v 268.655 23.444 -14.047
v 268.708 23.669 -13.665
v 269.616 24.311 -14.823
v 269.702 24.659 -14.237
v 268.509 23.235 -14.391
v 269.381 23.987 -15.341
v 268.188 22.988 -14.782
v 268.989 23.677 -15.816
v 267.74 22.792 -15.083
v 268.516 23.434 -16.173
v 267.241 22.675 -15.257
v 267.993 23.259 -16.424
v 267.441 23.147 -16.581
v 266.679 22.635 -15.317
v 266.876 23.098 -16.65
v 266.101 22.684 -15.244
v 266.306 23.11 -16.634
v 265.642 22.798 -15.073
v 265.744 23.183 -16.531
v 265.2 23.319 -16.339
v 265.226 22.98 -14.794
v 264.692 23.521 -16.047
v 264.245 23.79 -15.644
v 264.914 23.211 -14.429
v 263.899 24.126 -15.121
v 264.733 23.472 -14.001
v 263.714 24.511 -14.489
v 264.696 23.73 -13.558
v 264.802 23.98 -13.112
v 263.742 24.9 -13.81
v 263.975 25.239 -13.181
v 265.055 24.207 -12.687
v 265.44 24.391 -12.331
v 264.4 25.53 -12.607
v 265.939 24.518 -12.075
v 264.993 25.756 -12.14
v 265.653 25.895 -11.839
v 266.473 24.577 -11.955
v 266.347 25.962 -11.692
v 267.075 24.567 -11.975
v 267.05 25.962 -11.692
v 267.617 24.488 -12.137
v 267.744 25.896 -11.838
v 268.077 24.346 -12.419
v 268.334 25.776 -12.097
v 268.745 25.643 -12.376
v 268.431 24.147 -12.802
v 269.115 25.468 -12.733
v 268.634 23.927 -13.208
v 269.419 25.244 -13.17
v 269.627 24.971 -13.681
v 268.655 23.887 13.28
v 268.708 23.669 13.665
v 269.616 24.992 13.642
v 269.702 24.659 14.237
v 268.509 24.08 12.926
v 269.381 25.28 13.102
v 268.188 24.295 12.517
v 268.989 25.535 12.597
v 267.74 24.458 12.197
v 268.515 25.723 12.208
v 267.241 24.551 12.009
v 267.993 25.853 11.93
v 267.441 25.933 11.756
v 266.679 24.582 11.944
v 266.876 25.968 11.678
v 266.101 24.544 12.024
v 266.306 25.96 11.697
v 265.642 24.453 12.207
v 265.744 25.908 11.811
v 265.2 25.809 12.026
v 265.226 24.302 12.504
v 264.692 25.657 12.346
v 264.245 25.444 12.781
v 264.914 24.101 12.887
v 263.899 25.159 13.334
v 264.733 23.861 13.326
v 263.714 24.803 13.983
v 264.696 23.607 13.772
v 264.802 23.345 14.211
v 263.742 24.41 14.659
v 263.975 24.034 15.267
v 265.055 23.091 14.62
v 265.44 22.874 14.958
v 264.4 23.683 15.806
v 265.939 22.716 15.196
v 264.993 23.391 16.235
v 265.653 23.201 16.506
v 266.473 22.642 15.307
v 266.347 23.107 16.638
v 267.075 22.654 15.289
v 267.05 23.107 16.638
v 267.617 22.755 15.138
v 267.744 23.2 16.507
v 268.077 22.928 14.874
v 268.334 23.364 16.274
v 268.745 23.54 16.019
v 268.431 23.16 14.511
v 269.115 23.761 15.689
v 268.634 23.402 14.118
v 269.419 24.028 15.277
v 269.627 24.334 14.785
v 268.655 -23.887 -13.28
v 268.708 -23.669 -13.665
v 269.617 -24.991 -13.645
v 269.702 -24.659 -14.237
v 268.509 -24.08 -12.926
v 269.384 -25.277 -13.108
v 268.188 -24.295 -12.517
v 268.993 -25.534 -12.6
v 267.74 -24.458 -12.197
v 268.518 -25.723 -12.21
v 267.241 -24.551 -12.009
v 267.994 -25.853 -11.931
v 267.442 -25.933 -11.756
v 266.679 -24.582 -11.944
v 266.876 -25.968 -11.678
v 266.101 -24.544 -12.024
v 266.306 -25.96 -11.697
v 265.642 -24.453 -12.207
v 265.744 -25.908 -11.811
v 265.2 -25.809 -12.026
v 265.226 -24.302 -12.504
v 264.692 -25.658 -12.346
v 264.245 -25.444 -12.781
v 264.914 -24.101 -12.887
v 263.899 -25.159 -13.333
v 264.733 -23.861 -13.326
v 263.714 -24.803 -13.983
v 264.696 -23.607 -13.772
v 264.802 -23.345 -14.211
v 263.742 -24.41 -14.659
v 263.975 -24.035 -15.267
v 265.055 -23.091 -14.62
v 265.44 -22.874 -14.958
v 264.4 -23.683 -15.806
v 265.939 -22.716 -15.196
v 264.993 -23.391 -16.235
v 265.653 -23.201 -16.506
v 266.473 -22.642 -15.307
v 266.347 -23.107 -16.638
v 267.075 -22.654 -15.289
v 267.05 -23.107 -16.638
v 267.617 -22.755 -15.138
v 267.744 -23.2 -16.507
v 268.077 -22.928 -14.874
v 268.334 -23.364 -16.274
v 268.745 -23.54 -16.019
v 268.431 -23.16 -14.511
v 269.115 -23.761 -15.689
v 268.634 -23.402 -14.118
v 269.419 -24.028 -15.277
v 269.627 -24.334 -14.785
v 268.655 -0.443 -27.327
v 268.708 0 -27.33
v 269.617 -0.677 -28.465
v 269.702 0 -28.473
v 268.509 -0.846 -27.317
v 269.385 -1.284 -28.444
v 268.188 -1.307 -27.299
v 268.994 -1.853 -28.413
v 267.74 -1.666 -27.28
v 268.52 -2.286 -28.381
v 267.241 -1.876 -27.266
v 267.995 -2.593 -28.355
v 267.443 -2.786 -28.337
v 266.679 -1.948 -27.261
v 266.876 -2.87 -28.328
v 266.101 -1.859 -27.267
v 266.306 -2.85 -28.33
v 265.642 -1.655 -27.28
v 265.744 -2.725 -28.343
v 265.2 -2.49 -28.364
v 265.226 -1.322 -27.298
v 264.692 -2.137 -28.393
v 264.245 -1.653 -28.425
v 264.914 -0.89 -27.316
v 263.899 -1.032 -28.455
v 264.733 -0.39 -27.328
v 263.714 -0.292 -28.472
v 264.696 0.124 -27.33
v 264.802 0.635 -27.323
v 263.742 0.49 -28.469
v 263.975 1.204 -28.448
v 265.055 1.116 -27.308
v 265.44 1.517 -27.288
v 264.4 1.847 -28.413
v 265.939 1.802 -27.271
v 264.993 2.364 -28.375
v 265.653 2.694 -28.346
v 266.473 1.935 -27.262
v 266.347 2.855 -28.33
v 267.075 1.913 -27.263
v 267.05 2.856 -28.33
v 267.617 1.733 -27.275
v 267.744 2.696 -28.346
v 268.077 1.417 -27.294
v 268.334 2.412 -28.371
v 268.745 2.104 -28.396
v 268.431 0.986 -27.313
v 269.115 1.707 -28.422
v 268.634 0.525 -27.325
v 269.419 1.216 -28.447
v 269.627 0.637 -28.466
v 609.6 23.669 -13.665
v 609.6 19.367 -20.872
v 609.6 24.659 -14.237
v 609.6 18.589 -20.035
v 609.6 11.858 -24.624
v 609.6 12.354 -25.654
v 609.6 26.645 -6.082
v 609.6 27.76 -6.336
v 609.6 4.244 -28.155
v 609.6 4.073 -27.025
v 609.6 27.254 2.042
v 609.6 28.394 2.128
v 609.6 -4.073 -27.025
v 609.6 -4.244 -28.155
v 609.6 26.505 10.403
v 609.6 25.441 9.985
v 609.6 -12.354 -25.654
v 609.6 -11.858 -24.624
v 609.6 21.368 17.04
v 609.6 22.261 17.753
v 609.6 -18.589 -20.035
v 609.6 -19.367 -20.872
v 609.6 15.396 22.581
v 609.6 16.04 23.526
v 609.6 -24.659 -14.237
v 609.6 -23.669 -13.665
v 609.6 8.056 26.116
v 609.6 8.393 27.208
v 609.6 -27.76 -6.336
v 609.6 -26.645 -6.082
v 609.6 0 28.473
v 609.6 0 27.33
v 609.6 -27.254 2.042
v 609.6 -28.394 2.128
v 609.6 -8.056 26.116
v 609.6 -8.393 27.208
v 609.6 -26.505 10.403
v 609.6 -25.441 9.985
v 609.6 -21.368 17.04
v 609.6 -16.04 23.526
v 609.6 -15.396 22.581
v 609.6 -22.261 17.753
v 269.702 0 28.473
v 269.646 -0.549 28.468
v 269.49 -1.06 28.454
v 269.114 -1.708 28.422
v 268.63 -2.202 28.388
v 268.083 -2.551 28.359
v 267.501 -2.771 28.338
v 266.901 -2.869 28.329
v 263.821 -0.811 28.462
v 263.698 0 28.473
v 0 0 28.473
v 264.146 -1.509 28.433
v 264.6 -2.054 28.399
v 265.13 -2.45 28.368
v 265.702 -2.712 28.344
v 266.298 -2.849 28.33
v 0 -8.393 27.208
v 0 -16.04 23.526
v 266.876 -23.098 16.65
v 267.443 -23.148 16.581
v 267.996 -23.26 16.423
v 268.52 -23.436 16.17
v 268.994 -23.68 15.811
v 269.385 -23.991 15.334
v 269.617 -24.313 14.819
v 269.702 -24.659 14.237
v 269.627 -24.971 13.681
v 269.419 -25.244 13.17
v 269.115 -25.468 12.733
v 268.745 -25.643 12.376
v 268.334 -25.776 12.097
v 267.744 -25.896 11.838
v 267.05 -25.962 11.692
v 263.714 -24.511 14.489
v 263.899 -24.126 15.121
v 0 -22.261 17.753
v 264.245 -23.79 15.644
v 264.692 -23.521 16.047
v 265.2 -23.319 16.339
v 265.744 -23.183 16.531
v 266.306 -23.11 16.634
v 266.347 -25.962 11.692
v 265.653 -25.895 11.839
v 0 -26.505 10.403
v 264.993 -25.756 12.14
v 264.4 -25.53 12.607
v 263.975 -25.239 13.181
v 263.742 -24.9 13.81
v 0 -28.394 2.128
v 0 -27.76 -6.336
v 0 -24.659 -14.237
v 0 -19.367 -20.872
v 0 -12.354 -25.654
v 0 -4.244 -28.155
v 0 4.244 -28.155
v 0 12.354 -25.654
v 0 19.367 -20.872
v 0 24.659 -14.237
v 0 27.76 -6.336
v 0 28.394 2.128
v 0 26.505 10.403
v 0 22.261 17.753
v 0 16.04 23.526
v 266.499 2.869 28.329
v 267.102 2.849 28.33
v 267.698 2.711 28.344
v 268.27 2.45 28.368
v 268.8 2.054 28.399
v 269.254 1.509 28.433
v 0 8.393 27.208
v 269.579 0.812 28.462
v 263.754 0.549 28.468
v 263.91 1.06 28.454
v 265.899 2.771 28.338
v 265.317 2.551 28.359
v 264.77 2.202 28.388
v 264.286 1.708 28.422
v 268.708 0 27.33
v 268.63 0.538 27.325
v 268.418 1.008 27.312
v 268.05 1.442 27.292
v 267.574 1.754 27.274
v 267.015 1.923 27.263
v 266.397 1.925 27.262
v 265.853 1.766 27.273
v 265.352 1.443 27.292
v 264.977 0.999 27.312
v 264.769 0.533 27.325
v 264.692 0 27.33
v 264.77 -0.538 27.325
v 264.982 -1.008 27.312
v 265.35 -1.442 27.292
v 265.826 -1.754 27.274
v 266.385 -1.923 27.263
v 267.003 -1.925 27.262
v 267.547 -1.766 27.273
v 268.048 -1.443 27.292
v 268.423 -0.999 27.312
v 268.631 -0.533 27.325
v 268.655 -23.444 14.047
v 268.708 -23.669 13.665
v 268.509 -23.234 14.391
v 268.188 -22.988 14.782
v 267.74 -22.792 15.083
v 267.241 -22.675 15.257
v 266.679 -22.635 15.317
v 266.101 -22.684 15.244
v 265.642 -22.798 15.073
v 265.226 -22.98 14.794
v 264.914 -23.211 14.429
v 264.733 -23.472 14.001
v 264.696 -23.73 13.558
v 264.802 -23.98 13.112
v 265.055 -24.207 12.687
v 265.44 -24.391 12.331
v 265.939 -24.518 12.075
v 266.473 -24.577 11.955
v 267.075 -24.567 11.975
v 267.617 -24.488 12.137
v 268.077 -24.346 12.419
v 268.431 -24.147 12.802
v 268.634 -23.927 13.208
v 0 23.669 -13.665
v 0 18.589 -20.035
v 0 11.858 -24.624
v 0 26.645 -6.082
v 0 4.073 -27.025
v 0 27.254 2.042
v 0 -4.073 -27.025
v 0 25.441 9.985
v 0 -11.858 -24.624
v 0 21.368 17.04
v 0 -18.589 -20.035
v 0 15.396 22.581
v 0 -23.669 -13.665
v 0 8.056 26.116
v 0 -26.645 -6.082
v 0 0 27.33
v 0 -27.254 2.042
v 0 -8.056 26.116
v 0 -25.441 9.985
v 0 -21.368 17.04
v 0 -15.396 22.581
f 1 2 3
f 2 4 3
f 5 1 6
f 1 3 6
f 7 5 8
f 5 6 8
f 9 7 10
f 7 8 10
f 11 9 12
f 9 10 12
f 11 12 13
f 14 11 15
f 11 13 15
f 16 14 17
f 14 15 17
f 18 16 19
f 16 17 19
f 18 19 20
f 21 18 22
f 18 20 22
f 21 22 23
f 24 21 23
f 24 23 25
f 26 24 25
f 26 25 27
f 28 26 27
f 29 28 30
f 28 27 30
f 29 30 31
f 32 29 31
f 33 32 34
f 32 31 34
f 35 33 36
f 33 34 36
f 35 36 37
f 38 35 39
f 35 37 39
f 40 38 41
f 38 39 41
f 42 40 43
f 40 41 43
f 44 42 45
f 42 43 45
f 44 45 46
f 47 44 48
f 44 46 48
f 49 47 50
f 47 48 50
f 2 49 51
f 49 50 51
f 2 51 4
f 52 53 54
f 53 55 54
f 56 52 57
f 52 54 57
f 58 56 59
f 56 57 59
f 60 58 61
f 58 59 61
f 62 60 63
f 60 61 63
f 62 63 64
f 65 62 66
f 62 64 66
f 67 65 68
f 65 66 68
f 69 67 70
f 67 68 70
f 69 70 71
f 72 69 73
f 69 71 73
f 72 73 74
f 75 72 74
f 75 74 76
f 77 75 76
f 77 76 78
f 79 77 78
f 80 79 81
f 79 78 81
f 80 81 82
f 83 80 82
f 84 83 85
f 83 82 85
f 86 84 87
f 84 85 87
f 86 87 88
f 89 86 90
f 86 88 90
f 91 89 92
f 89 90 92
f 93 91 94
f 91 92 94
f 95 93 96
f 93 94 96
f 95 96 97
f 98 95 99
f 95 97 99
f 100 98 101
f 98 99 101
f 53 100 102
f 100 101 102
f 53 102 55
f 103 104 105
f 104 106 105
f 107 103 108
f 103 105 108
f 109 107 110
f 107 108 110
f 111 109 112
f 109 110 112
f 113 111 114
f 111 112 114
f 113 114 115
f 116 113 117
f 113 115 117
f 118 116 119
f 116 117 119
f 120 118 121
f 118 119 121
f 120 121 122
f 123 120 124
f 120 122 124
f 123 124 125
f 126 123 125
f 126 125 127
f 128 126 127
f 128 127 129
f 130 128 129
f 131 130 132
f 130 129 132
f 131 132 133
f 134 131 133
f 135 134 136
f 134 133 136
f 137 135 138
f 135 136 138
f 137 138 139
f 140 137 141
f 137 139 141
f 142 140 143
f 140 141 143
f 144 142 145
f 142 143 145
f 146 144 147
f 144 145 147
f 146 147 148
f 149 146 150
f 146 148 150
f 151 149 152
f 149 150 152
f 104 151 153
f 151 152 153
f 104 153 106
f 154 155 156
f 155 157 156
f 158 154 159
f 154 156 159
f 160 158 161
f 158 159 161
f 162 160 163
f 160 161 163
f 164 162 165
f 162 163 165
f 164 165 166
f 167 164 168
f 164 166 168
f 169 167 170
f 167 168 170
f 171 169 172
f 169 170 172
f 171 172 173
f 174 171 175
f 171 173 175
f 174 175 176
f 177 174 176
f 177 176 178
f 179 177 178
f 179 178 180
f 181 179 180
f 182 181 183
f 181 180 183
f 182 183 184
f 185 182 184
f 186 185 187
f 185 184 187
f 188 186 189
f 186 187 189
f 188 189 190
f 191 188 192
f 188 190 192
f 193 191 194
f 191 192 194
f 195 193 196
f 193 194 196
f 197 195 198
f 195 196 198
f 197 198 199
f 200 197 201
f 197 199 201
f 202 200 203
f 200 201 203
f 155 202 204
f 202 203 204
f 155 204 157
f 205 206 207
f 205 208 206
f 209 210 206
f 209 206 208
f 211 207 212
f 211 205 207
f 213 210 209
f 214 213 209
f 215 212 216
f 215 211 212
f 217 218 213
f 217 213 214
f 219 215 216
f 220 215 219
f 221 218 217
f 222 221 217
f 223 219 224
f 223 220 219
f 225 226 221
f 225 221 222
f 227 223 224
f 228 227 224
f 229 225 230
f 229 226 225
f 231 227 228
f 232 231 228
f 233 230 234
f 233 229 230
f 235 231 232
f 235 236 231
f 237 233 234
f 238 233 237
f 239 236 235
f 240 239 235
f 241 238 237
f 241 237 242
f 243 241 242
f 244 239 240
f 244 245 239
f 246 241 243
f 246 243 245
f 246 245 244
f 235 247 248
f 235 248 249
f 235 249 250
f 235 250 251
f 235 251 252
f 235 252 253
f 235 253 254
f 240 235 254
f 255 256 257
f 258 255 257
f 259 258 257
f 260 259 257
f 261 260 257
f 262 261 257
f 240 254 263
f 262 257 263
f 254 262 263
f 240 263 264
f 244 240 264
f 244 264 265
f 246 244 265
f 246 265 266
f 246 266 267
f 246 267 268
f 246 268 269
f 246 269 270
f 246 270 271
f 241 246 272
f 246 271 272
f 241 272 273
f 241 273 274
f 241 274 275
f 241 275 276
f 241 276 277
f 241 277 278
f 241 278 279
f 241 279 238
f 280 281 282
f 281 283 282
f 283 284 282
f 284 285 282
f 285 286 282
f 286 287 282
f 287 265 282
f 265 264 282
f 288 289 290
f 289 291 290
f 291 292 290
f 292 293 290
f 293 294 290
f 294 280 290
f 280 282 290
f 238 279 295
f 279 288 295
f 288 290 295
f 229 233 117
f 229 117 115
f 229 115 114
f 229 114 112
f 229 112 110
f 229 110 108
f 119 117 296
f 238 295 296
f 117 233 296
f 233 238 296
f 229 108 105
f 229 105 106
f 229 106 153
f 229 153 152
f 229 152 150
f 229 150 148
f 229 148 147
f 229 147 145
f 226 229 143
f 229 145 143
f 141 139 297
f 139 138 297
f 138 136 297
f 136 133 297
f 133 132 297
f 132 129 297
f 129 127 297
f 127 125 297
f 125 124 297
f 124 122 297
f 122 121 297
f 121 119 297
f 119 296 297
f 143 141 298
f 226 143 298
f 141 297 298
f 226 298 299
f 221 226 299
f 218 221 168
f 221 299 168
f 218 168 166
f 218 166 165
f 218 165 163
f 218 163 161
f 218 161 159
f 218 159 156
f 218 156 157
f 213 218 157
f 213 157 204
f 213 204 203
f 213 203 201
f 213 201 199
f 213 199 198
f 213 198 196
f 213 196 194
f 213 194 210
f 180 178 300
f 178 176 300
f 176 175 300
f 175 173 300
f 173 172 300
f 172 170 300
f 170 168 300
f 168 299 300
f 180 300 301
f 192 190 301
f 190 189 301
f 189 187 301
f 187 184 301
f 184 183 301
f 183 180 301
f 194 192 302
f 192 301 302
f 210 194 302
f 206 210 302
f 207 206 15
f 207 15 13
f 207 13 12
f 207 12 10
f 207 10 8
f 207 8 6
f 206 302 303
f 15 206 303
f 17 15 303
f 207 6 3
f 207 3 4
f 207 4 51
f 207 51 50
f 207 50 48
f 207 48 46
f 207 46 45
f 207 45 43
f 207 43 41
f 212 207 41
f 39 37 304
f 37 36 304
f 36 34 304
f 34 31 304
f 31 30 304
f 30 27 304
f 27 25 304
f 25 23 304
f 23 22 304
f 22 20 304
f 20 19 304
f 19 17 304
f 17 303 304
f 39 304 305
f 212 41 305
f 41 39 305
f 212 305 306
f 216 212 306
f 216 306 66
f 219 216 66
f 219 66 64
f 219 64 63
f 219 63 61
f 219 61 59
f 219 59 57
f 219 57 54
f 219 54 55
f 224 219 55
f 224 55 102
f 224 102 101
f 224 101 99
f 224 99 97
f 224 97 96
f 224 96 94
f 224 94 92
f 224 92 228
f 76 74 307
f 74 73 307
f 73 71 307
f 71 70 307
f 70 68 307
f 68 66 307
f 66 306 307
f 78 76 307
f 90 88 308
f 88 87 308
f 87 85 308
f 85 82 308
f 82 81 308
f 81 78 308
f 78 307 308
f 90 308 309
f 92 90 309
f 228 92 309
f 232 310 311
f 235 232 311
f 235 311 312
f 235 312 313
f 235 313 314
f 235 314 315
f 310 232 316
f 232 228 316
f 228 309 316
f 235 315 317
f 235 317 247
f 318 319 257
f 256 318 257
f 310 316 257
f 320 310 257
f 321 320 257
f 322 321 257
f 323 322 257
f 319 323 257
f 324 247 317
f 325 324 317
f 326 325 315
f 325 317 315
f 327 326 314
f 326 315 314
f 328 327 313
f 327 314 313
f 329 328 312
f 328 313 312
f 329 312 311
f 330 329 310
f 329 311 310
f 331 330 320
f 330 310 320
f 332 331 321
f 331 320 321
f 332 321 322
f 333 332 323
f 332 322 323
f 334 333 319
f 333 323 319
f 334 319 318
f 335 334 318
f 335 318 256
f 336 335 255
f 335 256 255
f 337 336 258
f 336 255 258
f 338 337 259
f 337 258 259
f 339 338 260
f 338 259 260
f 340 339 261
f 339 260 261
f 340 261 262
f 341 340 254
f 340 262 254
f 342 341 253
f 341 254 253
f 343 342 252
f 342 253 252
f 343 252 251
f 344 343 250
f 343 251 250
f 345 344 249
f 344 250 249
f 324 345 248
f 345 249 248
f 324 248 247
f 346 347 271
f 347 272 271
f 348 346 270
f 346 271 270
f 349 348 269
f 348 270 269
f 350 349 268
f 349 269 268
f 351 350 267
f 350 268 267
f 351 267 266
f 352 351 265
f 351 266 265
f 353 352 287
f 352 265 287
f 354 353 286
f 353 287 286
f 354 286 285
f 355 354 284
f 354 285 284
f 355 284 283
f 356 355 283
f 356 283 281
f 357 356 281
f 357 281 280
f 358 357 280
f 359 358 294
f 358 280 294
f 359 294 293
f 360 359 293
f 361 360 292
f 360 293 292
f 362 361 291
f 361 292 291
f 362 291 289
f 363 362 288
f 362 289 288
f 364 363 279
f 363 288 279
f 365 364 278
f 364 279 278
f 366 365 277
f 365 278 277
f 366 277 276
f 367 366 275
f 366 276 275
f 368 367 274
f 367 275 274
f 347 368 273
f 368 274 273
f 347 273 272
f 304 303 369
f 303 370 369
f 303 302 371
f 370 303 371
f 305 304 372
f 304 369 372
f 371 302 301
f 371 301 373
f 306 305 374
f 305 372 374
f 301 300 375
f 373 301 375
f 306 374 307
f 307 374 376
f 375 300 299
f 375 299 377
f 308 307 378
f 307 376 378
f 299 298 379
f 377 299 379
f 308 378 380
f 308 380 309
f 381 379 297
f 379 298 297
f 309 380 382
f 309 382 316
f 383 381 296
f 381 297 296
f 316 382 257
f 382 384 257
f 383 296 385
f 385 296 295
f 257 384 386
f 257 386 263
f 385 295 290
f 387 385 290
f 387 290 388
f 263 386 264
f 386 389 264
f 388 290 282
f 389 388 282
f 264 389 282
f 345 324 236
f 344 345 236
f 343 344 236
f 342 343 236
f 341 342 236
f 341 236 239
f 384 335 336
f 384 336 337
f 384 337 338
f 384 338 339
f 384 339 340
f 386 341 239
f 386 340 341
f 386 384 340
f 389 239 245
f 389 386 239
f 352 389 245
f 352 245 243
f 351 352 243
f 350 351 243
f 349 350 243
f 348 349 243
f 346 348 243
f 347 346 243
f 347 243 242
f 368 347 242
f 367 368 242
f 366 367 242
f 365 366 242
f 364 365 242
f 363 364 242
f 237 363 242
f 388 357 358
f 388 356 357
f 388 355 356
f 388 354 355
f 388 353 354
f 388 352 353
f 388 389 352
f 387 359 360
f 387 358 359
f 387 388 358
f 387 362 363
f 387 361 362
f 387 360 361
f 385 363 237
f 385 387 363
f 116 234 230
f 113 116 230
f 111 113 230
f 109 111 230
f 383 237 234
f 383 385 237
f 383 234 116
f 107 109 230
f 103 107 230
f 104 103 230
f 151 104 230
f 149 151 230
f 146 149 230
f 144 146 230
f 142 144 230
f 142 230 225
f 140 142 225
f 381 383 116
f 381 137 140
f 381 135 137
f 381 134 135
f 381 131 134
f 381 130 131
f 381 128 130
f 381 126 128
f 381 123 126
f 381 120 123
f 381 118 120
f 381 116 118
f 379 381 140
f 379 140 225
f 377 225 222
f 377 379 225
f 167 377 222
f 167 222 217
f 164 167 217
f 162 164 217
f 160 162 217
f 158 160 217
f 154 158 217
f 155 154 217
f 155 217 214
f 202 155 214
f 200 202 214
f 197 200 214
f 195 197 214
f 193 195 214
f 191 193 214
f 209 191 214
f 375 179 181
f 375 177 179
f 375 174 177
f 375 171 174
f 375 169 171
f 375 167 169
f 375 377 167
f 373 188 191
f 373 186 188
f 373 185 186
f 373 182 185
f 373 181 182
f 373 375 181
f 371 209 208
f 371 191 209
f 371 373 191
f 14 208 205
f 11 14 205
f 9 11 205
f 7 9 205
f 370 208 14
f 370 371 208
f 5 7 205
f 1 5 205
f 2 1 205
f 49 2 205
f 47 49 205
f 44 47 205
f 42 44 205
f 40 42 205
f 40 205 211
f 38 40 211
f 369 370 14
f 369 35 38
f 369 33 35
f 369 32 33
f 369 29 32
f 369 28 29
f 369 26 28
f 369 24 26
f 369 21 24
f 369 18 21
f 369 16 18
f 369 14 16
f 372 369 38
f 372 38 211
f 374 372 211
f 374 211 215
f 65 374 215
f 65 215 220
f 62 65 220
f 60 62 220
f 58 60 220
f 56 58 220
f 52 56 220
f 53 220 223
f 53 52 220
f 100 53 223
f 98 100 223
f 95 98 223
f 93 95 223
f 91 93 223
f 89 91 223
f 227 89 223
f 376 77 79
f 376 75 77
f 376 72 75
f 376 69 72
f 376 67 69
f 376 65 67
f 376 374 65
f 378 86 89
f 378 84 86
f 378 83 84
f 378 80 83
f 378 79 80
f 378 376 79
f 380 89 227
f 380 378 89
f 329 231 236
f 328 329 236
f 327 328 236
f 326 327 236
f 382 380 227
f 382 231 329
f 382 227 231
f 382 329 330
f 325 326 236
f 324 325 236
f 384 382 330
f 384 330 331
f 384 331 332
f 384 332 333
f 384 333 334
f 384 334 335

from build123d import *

# Parameters (mm, degrees)
SKETCH1_R           = 28.4734
SKETCH1_R_2         = 27.3304
BOSS_EXTRUDE1_DEPTH = 609.6
CIRPATTERN1_COUNT   = 6


# Read off the part's stored shape, not the designer's step: CSK for #5 Flat Head Machine Screw1
with BuildPart() as part:
    # Sketch1 → Boss-Extrude1 (new body)
    with BuildSketch(Plane(origin=(0, 0, 0), x_dir=(0, 0, -1), z_dir=(1, 0, 0))):
        with Locations(Location((0, 0, 0), (0, 0, 180))):
            Circle(SKETCH1_R)
        with Locations(Location((0, 0, 0), (0, 0, 180))):
            Circle(SKETCH1_R_2, mode=Mode.SUBTRACT)
    extrude(amount=BOSS_EXTRUDE1_DEPTH)

    # CSK for #5 Flat Head Machine Screw1 outl → CSK for #5 Flat Head Machine Screw1 (revolve, cut)
    with BuildSketch(Plane(origin=(266.7, 0, 0), x_dir=(1, 0, 0), z_dir=(0, -1, 0))):
        Polygon((3.001715891, 28.473440077), (0, 28.473440077), (0, 27.260877218), (1.947651078, 27.260877218), align=None)
    csk_for_5_flat_head_machine_screw1 = revolve(axis=Axis((266.7, 0, 0), (0, 0, 1)), mode=Mode.SUBTRACT)

    # CirPattern1: CSK for #5 Flat Head Machine Screw1 ×6 about axis
    cirpattern1_axis = Axis((609.6, 0, 0), (-1, 0, 0))
    for i in range(1, CIRPATTERN1_COUNT):
        add(csk_for_5_flat_head_machine_screw1.rotate(cirpattern1_axis, i * 360 / CIRPATTERN1_COUNT), mode=Mode.SUBTRACT)


solid = part.part
